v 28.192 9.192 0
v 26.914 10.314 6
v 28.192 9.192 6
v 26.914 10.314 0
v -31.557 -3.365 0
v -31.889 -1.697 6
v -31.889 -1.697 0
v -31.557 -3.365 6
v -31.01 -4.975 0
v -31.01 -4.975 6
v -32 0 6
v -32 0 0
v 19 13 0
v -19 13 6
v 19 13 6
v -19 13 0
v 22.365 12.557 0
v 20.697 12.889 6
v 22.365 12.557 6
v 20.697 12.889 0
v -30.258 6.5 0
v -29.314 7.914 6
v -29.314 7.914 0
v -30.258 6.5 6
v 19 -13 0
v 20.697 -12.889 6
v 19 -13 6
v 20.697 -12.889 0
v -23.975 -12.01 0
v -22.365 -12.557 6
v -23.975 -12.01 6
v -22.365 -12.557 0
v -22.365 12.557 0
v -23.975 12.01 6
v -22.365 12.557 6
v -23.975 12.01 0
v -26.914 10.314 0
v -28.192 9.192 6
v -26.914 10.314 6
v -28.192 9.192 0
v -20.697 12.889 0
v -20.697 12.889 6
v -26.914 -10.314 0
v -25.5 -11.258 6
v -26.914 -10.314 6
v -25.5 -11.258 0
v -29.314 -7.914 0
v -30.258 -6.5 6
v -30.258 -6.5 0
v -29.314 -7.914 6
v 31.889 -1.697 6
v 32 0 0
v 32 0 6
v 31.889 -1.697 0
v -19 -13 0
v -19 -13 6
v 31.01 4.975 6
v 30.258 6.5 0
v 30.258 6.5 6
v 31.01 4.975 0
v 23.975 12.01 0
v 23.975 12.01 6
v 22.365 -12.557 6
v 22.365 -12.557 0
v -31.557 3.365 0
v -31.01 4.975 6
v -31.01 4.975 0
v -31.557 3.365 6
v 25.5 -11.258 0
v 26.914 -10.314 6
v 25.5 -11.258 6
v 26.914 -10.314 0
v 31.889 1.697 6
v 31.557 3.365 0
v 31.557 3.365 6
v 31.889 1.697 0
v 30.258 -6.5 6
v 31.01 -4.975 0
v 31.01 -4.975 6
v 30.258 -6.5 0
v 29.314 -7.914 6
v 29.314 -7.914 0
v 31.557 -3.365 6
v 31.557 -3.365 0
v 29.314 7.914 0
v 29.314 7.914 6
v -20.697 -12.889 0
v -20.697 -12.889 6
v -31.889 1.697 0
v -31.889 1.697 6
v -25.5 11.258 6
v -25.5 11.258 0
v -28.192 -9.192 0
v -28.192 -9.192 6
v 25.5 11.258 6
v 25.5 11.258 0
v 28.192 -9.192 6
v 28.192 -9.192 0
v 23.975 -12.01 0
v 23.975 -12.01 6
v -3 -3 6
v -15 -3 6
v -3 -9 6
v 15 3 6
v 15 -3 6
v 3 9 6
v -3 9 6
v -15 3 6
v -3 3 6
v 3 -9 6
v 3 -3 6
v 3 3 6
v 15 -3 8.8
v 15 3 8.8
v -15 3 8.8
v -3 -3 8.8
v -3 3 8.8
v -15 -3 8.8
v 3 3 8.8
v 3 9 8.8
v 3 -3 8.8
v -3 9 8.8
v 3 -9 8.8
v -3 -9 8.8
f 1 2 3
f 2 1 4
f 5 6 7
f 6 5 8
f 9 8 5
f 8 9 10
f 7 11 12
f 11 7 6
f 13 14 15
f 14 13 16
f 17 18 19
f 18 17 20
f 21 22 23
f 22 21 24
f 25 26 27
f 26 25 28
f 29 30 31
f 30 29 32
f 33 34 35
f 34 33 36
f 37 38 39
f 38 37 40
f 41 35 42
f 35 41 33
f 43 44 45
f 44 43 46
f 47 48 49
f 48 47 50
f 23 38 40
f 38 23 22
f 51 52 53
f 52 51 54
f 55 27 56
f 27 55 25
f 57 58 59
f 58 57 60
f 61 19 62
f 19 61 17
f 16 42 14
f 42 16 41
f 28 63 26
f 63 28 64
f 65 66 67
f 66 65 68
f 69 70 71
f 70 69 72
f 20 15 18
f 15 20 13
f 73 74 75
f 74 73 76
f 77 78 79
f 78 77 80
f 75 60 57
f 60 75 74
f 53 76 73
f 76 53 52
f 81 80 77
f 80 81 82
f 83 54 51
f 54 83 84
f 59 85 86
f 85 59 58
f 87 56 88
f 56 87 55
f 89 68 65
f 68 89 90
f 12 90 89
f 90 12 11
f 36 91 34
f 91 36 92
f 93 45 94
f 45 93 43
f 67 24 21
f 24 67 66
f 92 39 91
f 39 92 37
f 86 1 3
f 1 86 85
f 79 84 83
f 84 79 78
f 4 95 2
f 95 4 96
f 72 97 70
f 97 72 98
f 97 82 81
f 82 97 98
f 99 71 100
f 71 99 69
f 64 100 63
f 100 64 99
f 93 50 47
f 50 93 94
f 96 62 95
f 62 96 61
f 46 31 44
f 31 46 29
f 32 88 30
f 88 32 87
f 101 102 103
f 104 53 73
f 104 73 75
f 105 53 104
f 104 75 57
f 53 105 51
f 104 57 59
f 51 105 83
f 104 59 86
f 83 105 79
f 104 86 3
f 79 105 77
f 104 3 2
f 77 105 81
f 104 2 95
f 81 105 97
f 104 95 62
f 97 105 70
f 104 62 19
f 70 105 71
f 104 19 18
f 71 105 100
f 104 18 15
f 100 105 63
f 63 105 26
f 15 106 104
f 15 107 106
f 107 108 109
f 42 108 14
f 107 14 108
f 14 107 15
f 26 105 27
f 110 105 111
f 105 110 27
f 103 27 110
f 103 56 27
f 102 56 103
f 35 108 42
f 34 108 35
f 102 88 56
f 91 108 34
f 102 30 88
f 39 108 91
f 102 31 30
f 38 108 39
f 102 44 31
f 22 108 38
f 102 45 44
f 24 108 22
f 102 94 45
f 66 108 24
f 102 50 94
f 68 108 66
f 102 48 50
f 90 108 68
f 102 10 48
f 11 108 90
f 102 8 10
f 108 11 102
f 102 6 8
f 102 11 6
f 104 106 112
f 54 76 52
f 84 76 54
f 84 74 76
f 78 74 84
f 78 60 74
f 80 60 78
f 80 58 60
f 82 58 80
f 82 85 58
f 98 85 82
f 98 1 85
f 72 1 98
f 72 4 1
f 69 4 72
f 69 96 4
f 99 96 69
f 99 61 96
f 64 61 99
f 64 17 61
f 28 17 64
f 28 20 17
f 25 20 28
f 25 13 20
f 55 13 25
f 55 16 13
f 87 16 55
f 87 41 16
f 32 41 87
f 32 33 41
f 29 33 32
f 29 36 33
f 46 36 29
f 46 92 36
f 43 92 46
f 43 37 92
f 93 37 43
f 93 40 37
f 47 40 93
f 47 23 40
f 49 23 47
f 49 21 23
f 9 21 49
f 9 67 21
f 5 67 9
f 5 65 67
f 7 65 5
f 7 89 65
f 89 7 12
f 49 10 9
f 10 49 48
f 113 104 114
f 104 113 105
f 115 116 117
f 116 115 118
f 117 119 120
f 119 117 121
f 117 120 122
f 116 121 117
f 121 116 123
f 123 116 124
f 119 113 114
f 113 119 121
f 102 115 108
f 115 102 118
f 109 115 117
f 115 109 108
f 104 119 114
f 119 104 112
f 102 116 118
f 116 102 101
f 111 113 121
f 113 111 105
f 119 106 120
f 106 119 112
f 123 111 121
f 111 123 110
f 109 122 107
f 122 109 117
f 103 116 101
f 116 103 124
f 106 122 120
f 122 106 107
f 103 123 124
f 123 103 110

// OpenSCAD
// Original demonstration shapes, MIT, Vase Mold Generator contributors.
// OpenSCAD -D 'example="medallion"' -o medallion.stl examples.scad
example="medallion";
if(example=="medallion") {
  union() {
    linear_extrude(6) hull() { translate([-19,0]) circle(r=13,$fn=48);translate([19,0]) circle(r=13,$fn=48); }
    translate([-15,-3,5.8]) cube([30,6,3]);
    translate([-3,-9,5.8]) cube([6,18,3]);
  }
} else if(example=="capsule") {
  hull() {translate([0,0,12]) sphere(r=12,$fn=32);translate([0,0,40]) sphere(r=12,$fn=32);}
} else if(example=="ring") {
  rotate_extrude($fn=48) translate([23,0]) circle(r=6,$fn=20);
}
